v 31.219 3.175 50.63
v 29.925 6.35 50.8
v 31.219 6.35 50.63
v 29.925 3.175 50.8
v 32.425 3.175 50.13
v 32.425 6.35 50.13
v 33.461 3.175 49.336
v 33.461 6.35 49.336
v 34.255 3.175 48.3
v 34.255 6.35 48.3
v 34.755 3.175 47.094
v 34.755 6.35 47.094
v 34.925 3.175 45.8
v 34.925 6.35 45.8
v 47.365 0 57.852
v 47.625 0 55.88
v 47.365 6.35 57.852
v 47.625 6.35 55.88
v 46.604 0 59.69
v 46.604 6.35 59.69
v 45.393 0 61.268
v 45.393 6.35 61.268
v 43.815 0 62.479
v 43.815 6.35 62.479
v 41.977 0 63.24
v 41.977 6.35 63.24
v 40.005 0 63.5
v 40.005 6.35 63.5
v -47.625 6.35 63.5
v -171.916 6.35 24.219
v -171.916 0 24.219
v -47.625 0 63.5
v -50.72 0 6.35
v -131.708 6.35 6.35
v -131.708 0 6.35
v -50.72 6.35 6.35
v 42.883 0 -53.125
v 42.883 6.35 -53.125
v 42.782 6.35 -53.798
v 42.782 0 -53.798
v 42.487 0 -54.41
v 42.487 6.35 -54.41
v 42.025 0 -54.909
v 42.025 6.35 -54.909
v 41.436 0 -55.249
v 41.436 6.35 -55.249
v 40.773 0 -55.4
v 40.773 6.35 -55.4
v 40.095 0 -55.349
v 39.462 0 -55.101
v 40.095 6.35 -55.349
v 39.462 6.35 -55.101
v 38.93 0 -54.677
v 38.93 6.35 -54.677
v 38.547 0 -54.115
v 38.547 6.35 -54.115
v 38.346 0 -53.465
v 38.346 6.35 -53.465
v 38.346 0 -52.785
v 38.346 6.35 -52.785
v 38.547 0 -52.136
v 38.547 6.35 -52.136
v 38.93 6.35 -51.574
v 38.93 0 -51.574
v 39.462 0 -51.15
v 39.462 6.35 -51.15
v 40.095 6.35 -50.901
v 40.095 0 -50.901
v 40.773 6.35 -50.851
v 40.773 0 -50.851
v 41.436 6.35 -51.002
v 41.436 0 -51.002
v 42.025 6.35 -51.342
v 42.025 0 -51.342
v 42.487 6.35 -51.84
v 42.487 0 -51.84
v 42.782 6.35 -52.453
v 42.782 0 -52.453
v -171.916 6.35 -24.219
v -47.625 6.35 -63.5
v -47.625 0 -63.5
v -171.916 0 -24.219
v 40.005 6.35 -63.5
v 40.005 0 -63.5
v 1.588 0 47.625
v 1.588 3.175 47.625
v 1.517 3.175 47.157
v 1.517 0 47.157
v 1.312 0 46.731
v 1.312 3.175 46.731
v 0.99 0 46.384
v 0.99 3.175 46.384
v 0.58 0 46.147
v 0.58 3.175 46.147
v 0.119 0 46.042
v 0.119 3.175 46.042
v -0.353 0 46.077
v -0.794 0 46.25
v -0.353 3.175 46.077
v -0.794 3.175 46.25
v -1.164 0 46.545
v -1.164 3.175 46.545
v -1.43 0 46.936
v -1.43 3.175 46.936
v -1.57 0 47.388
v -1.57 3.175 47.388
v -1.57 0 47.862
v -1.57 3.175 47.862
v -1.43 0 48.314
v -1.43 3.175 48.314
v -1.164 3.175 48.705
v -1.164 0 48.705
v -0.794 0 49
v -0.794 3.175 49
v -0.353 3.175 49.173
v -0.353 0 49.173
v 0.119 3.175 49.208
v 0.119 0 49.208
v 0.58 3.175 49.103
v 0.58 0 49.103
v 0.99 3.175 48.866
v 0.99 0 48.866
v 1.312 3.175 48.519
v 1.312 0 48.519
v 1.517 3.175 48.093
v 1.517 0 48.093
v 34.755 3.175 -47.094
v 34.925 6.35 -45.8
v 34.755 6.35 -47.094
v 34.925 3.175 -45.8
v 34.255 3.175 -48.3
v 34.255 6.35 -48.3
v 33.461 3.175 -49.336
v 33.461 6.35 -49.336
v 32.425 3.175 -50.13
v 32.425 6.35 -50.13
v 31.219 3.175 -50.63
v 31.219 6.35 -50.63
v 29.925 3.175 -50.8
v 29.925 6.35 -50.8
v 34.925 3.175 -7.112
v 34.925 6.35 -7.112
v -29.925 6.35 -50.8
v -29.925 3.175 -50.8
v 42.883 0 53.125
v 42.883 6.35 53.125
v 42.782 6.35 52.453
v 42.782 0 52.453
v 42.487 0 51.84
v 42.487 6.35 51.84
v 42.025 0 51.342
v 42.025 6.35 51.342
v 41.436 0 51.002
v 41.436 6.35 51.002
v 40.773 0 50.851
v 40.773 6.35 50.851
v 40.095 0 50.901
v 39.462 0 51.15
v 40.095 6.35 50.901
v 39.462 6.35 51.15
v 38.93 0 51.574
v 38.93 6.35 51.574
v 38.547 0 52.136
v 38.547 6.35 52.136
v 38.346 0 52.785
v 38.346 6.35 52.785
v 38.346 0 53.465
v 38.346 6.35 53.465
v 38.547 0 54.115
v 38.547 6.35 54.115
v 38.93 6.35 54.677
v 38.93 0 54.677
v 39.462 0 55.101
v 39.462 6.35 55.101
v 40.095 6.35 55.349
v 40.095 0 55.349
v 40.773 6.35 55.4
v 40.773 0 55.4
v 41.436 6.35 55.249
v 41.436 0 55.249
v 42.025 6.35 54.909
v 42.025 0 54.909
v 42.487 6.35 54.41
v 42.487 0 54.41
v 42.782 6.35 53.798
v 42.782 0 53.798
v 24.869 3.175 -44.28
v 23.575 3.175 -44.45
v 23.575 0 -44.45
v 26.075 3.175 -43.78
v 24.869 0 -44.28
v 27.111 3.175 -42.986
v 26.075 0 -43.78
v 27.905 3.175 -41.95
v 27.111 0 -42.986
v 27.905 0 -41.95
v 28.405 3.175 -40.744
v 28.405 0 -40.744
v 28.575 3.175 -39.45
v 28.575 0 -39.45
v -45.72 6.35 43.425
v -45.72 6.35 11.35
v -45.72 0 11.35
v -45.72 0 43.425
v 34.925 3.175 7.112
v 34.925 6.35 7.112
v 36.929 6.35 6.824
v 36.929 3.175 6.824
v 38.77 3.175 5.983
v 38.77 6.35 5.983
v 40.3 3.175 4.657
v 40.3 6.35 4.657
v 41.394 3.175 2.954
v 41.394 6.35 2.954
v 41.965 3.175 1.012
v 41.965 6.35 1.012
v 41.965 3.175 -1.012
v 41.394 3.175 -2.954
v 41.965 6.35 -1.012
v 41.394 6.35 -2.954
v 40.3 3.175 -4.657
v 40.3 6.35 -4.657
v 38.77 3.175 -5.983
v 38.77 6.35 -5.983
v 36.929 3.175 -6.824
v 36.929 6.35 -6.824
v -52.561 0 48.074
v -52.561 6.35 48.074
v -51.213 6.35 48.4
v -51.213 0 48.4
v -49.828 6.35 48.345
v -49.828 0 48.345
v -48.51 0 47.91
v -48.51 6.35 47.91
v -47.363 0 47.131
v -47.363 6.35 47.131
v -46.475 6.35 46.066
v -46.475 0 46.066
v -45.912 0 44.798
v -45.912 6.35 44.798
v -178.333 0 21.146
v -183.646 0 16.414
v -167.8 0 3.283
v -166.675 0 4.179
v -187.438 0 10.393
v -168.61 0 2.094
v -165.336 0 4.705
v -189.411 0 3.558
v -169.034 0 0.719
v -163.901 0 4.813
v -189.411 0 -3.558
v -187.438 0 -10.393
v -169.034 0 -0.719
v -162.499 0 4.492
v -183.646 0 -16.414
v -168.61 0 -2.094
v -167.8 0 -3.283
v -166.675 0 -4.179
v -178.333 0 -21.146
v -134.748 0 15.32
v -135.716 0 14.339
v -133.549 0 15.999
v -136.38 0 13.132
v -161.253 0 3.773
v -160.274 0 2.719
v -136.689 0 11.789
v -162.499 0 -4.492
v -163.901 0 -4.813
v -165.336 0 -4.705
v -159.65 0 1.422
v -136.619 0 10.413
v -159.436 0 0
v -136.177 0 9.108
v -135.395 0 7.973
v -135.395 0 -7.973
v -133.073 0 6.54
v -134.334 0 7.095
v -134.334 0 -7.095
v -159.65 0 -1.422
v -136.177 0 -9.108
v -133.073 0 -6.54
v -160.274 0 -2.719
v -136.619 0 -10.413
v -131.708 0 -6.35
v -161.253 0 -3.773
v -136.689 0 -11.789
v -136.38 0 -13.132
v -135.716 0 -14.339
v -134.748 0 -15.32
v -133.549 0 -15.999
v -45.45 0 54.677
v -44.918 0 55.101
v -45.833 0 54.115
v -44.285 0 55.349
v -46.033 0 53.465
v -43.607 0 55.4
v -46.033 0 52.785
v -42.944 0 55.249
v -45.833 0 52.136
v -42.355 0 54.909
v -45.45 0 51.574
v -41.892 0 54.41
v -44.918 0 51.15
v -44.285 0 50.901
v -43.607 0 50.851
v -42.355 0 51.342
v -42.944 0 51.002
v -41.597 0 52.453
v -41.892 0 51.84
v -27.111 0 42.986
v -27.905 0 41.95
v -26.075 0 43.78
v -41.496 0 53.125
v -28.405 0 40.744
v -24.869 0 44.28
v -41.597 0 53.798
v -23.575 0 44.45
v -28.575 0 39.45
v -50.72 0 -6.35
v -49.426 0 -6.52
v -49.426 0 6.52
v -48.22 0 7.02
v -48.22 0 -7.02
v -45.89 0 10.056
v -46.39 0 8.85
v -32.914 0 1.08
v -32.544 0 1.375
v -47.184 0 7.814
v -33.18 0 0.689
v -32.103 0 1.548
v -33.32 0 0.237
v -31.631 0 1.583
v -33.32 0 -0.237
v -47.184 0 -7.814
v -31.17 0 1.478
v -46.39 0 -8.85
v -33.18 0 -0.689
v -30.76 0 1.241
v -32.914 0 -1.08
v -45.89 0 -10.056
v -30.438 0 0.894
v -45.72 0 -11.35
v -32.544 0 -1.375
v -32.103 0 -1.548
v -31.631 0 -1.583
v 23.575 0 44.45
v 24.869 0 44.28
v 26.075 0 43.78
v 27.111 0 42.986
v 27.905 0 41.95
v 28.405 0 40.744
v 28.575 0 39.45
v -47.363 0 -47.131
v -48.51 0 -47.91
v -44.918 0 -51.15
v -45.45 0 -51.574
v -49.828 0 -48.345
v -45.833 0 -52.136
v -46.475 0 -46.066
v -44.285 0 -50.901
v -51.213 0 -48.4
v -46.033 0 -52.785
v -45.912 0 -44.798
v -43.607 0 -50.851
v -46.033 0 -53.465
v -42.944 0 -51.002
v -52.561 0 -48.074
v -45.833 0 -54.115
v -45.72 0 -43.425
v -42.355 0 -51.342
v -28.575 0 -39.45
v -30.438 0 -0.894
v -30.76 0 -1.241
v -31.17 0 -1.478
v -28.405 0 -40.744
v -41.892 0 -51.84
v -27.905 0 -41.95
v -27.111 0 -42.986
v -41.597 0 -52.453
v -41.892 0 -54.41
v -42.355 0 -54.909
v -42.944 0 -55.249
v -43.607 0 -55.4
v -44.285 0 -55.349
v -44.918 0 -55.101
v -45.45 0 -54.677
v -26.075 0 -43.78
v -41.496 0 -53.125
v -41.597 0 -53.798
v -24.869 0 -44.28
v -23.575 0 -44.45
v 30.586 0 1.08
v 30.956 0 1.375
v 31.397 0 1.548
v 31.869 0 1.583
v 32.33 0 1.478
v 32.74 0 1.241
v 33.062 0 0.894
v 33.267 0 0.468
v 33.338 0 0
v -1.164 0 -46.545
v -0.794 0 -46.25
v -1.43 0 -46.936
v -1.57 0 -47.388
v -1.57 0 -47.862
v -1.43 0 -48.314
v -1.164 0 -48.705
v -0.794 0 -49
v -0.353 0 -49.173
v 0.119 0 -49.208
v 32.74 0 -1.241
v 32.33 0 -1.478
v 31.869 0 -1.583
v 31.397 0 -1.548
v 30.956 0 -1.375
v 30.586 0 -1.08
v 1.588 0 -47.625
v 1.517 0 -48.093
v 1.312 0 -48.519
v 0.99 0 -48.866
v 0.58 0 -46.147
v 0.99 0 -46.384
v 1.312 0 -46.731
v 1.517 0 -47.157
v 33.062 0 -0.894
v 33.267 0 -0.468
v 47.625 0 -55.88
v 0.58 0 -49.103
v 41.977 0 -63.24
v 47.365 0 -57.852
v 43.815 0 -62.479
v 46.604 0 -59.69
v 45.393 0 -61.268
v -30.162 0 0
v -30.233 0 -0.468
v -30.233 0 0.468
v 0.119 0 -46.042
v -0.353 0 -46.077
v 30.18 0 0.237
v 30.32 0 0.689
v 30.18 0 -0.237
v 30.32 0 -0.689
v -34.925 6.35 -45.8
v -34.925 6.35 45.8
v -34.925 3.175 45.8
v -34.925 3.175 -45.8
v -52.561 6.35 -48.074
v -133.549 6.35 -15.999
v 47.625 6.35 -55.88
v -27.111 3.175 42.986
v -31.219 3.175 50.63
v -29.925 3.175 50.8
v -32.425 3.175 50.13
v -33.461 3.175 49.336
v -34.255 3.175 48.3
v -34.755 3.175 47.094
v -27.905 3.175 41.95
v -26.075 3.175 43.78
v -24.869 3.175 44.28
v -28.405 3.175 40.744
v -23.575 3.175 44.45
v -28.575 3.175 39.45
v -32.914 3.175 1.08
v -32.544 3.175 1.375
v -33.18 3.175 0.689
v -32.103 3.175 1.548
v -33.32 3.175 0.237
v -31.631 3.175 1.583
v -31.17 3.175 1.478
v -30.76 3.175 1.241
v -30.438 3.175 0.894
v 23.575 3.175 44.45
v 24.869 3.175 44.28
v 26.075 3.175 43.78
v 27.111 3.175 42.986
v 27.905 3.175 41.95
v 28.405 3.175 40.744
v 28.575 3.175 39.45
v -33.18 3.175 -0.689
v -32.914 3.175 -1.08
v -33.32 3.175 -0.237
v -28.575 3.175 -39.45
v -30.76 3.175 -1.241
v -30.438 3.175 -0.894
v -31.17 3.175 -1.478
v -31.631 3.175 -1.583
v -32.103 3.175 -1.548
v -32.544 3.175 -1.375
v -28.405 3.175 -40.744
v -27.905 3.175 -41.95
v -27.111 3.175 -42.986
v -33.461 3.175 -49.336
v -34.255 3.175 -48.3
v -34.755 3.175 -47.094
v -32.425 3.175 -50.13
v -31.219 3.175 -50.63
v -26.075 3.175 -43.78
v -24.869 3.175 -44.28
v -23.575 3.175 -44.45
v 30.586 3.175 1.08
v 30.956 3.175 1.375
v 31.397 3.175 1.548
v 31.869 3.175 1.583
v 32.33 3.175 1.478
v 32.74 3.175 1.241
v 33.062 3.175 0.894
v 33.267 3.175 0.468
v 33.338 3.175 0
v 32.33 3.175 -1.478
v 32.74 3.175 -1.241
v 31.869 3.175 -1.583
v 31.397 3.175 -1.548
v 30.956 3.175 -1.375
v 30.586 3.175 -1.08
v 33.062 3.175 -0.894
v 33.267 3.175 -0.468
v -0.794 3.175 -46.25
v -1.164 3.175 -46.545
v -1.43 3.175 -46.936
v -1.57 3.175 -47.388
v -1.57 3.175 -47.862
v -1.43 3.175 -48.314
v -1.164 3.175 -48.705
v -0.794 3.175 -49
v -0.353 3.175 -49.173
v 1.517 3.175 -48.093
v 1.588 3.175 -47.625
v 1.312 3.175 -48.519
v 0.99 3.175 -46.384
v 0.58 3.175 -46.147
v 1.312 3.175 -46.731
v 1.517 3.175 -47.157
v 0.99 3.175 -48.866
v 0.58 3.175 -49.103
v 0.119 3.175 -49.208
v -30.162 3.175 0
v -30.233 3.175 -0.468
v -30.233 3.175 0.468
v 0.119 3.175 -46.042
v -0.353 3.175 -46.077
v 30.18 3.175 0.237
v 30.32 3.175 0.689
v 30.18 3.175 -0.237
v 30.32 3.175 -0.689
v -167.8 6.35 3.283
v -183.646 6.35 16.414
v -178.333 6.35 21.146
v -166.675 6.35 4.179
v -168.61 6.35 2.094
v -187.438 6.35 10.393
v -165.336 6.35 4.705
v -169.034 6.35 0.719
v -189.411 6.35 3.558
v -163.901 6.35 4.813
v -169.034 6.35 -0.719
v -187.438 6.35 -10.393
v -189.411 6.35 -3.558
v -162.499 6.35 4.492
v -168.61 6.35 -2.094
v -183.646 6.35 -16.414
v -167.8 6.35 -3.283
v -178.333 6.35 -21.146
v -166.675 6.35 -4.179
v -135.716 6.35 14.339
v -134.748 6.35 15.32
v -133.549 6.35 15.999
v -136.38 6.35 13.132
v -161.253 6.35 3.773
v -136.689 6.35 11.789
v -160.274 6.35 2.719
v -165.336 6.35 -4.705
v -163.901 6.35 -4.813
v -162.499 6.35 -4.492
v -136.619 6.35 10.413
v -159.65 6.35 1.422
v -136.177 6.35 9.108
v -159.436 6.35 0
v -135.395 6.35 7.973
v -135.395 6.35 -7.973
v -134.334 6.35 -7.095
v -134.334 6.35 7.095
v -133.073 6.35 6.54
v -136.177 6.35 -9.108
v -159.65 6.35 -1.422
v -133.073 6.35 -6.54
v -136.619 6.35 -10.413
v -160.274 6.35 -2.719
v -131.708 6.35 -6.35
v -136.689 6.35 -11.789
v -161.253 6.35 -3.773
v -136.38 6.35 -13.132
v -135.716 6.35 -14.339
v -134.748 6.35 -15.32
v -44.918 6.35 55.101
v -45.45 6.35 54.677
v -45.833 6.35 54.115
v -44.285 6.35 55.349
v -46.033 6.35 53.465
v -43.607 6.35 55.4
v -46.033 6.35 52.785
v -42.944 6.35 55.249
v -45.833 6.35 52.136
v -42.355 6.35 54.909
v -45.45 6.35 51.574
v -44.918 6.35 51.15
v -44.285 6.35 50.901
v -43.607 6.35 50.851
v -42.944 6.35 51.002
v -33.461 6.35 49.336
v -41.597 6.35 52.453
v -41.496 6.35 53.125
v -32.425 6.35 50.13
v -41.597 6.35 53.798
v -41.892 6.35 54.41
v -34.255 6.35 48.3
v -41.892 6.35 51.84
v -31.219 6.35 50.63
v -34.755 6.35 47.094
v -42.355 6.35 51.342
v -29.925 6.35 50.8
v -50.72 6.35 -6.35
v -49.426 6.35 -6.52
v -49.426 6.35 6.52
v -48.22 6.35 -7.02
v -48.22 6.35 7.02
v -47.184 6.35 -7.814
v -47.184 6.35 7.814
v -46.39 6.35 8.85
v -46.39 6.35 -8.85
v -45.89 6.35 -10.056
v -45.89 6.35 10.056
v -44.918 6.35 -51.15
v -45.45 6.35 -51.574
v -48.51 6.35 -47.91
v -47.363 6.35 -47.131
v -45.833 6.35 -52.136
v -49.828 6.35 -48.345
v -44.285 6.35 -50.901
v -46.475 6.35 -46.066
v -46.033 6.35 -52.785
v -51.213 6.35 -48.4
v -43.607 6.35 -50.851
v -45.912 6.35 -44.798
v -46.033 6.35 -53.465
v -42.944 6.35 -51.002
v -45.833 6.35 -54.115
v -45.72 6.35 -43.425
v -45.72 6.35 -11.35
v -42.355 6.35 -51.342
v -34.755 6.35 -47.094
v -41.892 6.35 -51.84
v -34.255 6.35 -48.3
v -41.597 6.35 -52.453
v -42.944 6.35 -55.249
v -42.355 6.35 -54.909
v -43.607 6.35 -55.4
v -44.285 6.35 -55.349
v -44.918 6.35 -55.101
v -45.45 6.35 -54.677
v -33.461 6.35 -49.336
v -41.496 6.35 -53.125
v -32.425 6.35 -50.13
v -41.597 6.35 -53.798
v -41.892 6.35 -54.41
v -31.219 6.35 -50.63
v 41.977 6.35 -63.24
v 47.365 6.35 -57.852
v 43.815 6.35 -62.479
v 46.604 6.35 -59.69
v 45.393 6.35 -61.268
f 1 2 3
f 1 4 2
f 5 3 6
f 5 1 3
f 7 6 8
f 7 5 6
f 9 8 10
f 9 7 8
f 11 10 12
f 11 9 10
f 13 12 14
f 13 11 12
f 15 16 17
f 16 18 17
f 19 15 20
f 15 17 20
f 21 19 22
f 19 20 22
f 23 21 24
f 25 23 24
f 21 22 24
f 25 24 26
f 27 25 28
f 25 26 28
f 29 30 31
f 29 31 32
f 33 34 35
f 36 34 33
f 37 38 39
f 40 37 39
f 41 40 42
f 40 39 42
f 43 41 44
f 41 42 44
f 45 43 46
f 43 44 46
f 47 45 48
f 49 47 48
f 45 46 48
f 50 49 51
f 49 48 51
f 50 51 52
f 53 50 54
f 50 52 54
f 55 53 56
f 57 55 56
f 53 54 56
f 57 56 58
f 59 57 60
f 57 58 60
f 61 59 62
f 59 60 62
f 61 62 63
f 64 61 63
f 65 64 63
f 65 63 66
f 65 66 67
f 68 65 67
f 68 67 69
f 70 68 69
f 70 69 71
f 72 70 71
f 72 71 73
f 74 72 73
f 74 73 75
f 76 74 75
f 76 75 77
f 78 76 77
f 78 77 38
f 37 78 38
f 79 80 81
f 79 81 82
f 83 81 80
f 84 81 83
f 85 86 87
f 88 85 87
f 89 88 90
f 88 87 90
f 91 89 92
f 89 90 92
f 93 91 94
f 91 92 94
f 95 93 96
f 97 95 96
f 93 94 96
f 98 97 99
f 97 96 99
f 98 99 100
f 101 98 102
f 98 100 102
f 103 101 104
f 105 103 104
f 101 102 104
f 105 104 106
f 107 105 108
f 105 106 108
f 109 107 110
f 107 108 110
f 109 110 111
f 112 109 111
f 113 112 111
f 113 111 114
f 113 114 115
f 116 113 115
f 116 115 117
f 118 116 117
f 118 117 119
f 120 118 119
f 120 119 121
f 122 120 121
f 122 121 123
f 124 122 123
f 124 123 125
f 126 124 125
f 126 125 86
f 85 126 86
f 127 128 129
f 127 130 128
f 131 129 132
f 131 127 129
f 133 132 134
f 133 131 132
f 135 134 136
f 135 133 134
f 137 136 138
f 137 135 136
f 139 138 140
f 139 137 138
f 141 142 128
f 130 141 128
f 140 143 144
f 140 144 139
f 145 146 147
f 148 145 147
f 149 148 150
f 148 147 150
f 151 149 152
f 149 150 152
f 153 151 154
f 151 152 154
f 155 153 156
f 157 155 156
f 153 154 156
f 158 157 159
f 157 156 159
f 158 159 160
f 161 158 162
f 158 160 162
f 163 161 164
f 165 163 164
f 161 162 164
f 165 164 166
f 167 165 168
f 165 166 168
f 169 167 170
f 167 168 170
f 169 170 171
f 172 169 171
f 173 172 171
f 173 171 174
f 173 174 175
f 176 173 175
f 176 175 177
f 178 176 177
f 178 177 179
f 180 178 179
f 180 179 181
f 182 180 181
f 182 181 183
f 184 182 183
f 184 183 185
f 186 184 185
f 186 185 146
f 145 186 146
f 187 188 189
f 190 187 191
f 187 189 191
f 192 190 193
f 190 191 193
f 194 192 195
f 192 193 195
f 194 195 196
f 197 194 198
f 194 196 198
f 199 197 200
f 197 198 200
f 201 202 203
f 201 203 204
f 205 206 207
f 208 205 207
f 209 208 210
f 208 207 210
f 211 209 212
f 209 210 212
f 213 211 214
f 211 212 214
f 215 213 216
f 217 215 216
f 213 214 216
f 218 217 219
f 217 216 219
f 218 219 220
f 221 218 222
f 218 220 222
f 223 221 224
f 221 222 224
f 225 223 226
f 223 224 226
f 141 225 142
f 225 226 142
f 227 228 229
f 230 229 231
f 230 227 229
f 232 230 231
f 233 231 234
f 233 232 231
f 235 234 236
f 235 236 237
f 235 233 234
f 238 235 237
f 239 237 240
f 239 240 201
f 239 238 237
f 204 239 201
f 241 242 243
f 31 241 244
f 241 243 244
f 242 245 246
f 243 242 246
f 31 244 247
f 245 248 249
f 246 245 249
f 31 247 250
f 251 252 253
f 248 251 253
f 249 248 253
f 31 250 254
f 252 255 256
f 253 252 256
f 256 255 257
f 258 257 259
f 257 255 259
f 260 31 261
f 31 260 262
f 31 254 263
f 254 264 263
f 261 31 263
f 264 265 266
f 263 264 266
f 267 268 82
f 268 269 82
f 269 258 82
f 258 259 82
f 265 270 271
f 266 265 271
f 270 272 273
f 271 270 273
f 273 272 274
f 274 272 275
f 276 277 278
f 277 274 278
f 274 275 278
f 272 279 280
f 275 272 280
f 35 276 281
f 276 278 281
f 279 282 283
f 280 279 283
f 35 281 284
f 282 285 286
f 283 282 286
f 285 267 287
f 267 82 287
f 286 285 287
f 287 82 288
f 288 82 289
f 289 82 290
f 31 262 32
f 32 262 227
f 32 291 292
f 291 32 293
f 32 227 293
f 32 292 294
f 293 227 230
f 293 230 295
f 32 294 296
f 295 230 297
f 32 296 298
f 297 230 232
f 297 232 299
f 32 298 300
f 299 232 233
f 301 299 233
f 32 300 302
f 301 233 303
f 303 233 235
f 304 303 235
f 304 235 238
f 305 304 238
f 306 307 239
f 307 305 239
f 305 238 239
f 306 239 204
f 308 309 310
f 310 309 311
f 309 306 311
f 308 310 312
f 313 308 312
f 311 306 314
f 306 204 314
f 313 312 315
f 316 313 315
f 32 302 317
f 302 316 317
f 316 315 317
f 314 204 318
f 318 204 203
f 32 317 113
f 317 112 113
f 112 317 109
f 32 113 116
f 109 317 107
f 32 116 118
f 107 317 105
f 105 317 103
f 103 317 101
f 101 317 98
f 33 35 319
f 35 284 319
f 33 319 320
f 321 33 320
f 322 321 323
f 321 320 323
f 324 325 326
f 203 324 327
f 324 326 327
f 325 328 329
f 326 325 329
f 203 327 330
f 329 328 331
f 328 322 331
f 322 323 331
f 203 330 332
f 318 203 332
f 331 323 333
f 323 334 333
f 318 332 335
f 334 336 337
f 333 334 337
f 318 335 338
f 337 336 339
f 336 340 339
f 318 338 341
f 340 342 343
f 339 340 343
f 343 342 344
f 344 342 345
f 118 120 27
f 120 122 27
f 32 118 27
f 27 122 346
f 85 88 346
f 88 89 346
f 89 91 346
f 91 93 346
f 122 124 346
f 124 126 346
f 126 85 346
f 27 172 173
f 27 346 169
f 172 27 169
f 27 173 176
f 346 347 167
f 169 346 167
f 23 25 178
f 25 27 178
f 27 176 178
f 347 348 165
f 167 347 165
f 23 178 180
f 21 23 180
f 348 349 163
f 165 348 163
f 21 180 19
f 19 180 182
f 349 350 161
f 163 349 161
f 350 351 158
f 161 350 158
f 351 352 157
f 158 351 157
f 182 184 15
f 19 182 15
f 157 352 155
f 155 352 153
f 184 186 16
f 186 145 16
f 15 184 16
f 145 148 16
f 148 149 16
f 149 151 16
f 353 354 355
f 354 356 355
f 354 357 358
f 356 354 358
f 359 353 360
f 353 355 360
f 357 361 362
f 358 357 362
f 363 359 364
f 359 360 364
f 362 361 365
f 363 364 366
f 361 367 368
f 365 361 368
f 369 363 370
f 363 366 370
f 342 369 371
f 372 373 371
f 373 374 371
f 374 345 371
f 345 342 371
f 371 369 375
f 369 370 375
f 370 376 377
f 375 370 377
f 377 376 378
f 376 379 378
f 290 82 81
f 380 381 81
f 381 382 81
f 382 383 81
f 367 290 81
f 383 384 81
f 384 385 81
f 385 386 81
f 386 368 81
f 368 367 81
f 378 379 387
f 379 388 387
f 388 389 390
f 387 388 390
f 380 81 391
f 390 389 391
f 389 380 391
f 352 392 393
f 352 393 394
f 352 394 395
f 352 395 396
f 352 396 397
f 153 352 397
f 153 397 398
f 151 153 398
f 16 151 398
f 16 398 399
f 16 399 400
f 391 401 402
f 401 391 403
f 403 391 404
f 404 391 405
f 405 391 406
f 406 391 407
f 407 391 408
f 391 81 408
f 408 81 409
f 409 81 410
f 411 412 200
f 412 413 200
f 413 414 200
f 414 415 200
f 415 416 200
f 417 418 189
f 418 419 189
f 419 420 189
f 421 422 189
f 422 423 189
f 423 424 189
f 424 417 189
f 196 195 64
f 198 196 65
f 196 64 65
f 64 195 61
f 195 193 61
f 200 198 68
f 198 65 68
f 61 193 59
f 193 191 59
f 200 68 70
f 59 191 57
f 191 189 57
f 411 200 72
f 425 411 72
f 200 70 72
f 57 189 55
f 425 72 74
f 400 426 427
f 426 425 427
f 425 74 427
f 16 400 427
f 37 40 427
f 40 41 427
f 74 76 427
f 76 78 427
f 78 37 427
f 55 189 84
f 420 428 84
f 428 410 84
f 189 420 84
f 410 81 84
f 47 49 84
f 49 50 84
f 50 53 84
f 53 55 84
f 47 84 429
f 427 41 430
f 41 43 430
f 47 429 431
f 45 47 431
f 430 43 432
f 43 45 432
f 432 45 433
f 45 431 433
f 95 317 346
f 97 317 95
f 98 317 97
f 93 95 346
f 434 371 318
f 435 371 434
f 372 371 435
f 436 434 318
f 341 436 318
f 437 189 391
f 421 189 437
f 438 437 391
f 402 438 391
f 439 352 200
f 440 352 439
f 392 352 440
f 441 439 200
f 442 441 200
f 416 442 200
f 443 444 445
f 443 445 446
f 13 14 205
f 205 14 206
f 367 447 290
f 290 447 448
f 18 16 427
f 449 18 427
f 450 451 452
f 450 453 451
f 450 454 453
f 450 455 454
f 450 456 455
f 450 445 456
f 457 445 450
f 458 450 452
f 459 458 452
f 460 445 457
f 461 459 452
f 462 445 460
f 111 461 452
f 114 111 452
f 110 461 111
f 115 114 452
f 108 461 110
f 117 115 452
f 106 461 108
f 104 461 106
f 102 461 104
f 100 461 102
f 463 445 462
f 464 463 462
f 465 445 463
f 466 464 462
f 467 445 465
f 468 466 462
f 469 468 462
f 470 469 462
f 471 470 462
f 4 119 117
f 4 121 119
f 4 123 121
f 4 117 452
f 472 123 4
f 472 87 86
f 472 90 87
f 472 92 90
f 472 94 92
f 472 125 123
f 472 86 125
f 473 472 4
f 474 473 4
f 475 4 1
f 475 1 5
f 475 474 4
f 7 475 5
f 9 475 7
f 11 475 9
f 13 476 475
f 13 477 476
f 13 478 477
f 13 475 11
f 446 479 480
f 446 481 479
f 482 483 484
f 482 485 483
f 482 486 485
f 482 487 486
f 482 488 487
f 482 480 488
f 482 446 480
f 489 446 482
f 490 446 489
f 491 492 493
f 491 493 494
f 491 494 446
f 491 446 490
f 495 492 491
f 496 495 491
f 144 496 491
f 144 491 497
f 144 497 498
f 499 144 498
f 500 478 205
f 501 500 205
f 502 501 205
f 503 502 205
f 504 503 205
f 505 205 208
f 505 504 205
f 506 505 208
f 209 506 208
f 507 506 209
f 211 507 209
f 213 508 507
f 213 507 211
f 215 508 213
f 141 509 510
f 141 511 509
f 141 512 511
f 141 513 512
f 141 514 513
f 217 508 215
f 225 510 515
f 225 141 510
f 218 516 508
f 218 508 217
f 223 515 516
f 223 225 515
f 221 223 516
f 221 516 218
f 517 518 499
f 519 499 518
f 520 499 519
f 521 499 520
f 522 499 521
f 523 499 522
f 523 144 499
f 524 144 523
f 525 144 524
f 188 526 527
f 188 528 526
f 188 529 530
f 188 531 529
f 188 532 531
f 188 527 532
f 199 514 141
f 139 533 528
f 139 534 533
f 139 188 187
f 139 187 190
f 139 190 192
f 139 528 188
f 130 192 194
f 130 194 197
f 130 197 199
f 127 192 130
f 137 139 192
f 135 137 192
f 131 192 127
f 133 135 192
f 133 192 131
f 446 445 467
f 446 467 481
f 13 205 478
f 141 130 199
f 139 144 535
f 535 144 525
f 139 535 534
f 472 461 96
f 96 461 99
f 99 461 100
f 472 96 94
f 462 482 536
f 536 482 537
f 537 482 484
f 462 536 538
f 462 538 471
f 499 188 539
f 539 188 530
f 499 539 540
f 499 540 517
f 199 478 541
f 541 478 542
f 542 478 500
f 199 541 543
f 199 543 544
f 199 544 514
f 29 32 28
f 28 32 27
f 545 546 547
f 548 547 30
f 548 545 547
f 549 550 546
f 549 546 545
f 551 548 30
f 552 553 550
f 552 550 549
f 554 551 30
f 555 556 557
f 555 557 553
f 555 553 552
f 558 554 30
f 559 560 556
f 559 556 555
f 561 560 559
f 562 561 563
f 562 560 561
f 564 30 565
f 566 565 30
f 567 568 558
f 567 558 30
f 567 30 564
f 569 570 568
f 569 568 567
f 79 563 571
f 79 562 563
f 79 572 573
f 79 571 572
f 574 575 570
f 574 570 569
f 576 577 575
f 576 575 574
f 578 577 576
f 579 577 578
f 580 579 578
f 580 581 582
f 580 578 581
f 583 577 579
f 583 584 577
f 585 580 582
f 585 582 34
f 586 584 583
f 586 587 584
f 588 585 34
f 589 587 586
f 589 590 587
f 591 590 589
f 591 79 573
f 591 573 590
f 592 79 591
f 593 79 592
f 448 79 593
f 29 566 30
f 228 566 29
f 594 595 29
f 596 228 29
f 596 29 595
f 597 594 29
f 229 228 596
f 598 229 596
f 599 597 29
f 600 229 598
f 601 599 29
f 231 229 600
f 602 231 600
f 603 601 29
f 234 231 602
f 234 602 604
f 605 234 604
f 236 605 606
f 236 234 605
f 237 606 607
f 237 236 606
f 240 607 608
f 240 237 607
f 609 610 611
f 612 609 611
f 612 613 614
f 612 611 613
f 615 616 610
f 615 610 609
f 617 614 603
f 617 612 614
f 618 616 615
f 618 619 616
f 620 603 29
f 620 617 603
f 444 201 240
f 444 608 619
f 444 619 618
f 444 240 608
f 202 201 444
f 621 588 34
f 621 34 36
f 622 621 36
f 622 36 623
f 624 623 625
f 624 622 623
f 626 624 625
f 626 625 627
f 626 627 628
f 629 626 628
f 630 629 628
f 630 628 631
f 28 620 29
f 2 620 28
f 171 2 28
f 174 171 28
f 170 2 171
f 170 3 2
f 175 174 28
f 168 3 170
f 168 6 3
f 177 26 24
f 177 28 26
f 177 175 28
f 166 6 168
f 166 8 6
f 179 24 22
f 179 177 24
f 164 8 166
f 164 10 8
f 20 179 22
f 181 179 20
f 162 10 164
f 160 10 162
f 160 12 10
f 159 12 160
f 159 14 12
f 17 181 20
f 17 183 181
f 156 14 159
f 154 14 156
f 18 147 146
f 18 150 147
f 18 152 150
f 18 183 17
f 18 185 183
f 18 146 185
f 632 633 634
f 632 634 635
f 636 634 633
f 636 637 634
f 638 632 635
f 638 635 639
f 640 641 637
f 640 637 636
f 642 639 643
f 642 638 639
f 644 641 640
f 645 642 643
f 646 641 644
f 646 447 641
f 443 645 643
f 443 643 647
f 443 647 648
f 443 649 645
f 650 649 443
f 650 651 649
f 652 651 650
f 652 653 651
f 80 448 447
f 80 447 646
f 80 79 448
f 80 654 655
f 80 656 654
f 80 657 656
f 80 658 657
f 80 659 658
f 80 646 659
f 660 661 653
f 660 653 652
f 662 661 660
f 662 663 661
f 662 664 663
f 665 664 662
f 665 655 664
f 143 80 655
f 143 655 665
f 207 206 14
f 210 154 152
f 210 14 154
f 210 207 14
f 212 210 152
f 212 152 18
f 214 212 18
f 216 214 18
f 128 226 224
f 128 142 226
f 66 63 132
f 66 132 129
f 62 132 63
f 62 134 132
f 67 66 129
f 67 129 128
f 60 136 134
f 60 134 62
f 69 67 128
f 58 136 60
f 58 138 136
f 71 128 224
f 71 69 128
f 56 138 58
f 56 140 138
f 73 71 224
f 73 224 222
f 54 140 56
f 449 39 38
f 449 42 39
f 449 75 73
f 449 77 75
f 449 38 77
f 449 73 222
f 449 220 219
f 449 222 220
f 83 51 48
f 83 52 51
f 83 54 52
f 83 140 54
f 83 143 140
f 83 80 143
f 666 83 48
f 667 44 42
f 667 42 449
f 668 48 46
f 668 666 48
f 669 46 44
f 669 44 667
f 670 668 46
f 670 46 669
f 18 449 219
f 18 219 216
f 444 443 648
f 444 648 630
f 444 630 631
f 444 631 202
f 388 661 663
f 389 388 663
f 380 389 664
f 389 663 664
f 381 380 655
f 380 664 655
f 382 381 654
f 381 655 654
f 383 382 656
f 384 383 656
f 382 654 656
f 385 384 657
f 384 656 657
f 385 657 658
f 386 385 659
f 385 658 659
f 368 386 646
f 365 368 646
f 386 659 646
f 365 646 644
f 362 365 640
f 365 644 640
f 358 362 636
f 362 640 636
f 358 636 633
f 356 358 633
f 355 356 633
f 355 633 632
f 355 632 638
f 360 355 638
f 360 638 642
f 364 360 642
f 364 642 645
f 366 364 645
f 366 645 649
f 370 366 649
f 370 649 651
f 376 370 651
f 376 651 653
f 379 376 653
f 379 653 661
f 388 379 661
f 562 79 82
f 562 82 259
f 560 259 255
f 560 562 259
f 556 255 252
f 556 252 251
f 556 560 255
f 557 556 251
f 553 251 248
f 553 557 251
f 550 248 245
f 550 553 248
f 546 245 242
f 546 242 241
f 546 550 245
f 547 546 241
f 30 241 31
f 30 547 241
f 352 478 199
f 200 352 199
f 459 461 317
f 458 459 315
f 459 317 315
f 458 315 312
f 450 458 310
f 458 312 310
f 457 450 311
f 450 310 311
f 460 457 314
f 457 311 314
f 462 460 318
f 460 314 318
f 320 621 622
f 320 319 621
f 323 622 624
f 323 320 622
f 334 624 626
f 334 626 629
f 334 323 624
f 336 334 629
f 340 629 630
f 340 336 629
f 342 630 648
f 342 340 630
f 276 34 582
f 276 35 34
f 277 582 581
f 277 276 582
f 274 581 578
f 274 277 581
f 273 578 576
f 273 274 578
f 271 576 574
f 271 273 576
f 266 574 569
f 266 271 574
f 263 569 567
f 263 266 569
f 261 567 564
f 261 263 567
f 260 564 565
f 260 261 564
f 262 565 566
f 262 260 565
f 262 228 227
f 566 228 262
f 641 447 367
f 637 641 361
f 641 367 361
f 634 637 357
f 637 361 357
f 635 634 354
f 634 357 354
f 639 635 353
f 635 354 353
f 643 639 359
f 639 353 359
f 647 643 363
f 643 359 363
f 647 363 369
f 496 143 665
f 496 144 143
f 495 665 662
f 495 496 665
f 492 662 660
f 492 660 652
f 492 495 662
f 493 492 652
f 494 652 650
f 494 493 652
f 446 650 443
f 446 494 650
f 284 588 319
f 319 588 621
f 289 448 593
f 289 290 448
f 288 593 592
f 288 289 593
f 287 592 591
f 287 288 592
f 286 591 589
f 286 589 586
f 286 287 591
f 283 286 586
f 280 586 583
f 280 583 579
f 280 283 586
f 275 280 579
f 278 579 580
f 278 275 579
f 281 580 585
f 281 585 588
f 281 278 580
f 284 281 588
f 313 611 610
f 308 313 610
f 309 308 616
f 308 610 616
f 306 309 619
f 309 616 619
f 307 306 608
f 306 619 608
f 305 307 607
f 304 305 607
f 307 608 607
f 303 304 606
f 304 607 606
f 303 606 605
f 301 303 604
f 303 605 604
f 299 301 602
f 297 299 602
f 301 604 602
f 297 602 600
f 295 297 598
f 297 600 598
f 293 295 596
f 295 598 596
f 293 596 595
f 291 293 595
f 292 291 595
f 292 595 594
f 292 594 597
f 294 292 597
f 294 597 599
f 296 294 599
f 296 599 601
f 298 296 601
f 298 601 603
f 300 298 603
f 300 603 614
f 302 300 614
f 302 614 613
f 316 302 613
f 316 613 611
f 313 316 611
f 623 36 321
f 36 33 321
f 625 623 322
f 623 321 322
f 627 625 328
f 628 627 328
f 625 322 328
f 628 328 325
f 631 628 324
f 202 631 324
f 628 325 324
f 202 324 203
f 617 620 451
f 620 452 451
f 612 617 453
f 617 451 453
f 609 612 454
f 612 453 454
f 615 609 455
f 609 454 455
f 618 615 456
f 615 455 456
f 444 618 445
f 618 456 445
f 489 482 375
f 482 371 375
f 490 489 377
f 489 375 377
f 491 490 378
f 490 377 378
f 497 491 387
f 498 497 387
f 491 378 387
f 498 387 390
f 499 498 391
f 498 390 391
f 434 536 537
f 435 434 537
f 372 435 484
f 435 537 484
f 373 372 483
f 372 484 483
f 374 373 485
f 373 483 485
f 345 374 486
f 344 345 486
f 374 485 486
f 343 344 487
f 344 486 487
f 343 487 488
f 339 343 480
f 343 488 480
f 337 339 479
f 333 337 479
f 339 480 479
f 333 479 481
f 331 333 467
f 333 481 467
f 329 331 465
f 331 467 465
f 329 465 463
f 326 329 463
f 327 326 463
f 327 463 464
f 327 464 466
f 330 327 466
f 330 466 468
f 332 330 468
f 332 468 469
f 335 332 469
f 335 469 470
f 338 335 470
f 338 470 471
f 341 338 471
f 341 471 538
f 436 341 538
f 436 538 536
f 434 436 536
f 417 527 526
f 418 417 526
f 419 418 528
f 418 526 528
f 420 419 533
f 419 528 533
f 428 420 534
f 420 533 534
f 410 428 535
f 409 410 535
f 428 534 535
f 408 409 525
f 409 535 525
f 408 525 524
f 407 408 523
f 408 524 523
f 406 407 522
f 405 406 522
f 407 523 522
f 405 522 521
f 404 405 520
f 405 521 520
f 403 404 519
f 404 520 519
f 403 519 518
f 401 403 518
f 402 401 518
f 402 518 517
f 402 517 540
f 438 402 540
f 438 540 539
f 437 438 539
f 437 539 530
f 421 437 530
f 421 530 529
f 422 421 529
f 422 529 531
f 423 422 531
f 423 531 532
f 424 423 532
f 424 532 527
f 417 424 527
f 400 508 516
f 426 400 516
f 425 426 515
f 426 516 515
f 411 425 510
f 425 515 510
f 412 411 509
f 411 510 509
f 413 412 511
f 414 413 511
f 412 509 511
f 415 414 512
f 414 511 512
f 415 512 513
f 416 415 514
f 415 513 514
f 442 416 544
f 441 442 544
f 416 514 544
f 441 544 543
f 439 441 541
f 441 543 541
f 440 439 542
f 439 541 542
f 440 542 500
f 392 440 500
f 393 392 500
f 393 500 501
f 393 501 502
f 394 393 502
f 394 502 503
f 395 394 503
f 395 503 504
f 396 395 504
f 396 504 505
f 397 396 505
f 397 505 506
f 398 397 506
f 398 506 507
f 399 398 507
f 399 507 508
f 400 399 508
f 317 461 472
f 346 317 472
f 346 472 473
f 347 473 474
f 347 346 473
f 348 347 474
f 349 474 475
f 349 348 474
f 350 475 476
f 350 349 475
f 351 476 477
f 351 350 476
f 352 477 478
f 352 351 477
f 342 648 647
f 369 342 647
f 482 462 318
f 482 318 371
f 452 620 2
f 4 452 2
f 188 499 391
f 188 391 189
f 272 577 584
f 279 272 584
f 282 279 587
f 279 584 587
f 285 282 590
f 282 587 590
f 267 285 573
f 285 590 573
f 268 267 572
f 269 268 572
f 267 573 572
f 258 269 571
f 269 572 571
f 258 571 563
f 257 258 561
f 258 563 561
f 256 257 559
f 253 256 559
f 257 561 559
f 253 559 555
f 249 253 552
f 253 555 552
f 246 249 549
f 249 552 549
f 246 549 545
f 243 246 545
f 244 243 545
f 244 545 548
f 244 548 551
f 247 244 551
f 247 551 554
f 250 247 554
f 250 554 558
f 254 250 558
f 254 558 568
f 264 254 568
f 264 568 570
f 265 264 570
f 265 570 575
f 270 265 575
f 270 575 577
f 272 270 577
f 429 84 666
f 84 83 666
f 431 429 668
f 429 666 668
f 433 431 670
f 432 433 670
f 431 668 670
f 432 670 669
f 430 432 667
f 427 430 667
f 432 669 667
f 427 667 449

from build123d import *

# Parameters (mm, degrees)
SKETCH1_W           = 95.25
SKETCH1_H           = 127
BOSS_EXTRUDE1_DEPTH = 6.35
BOSS_EXTRUDE3_DEPTH = 6.35
SKETCH5_R           = 4.826
CUT_EXTRUDE1_DEPTH  = 7.35
CUT_EXTRUDE2_DEPTH  = 7.35
FILLET9_R           = 5
SKETCH7_R           = 5.453804141
BOSS_EXTRUDE4_DEPTH = 6.35
SKETCH8_W           = 69.85
SKETCH8_H           = 101.6
CUT_EXTRUDE3_DEPTH  = 3.175
SKETCH9_W           = 57.15
SKETCH9_H           = 88.9
CUT_EXTRUDE4_DEPTH  = 4.175
SKETCH11_R          = 1.5875
CUT_EXTRUDE6_DEPTH  = 4.175
CUT_EXTRUDE7_DEPTH  = 3.175
FILLET10_R          = 5
FILLET11_R          = 5
FILLET12_R          = 7.62
SKETCH13_R          = 2.2812375
CUT_EXTRUDE8_DEPTH  = 7.35


with BuildPart() as part:
    # Sketch1 → Boss-Extrude1 (new body)
    with BuildSketch(Plane(origin=(0, 0, 0), x_dir=(1, 0, 0), z_dir=(0, 1, 0))):
        Rectangle(SKETCH1_W, SKETCH1_H)
    extrude(amount=BOSS_EXTRUDE1_DEPTH)

    # Sketch4 → Boss-Extrude3 (add)
    with BuildSketch(Plane(origin=(0, 6.35, 0), x_dir=(1, 0, 0), z_dir=(0, 1, 0))):
        with BuildLine():
            Line((-47.625, 63.5), (-171.916018217, 24.219268021))
            ThreePointArc((-171.916018217, 24.219268021), (-189.6618, 0), (-171.916018217, -24.219268021))
            Line((-171.916018217, -24.219268021), (-47.625, -63.5))
            Line((-47.625, -63.5), (-47.625, 63.5))
        make_face()
    extrude(amount=-BOSS_EXTRUDE3_DEPTH)

    # Sketch5 → Cut-Extrude1 (cut, through all)
    with BuildSketch(Plane(origin=(0, 6.35, 0), x_dir=(1, 0, 0), z_dir=(0, 1, 0))):
        with Locations((-164.2618, 0)):
            Circle(SKETCH5_R)
        with Locations((-8.6868, 0)):
            Circle(SKETCH5_R)
    extrude(amount=-CUT_EXTRUDE1_DEPTH, mode=Mode.SUBTRACT)

    # Sketch6 → Cut-Extrude2 (cut, through all)
    with BuildSketch(Plane(origin=(0, 6.35, 0), x_dir=(1, 0, 0), z_dir=(0, 1, 0))):
        Polygon((-45.72, 50.782905742), (-157.9118, 6.35), (-45.72, 6.35), align=None)
        Polygon((-45.72, -6.35), (-45.72, -50.782905742), (-157.9118, -6.35), align=None)
    extrude(amount=-CUT_EXTRUDE2_DEPTH, mode=Mode.SUBTRACT)

    # Fillet9
    fillet9_edges = [part.edges().sort_by_distance(p)[0] for p in [
        (-45.72, 3.175, -50.782905742),
        (-45.72, 3.175, -6.35),
        (-157.9118, 3.175, -6.35),
        (-157.9118, 3.175, 6.35),
        (-45.72, 3.175, 6.35),
        (-45.72, 3.175, 50.782905742),
    ]]
    fillet(fillet9_edges, radius=FILLET9_R)

    # Sketch7 → Boss-Extrude4 (add)
    with BuildSketch(Plane(origin=(0, 6.35, 0), x_dir=(1, 0, 0), z_dir=(0, 1, 0))):
        with Locations((-8.6868, 0)):
            Circle(SKETCH7_R)
    extrude(amount=-BOSS_EXTRUDE4_DEPTH)

    # Sketch8 → Cut-Extrude3 (cut)
    with BuildSketch(Plane(origin=(0, 6.35, 0), x_dir=(1, 0, 0), z_dir=(0, 1, 0))):
        Rectangle(SKETCH8_W, SKETCH8_H)
    extrude(amount=-CUT_EXTRUDE3_DEPTH, mode=Mode.SUBTRACT)

    # Sketch9 → Cut-Extrude4 (cut, through all)
    with BuildSketch(Plane(origin=(0, 3.175, 0), x_dir=(1, 0, 0), z_dir=(0, 1, 0))):
        Rectangle(SKETCH9_W, SKETCH9_H)
    extrude(amount=-CUT_EXTRUDE4_DEPTH, mode=Mode.SUBTRACT)

    # Sketch11 → Cut-Extrude6 (cut, through all)
    with BuildSketch(Plane(origin=(0, 3.175, 0), x_dir=(1, 0, 0), z_dir=(0, 1, 0))):
        with Locations((-31.75, 0)):
            Circle(SKETCH11_R)
        with Locations((31.75, 0)):
            Circle(SKETCH11_R)
        with Locations((0, 47.625)):
            Circle(SKETCH11_R)
        with Locations((0, -47.625)):
            Circle(SKETCH11_R)
    extrude(amount=-CUT_EXTRUDE6_DEPTH, mode=Mode.SUBTRACT)

    # Sketch12 → Cut-Extrude7 (cut)
    with BuildSketch(Plane(origin=(0, 6.35, 0), x_dir=(1, 0, 0), z_dir=(0, 1, 0))):
        with BuildLine():
            Line((34.925, 7.112), (34.925, -7.112))
            ThreePointArc((34.925, -7.112), (42.037, 0), (34.925, 7.112))
        make_face()
    extrude(amount=-CUT_EXTRUDE7_DEPTH, mode=Mode.SUBTRACT)

    # Fillet10
    fillet10_edges = [part.edges().sort_by_distance(p)[0] for p in [
        (-34.925, 4.7625, -50.8),
        (34.925, 4.7625, -50.8),
        (34.925, 4.7625, 50.8),
        (-34.925, 4.7625, 50.8),
    ]]
    fillet(fillet10_edges, radius=FILLET10_R)

    # Fillet11
    fillet11_edges = [part.edges().sort_by_distance(p)[0] for p in [
        (-28.575, 1.5875, 44.45),
        (-28.575, 1.5875, -44.45),
        (28.575, 1.5875, -44.45),
        (28.575, 1.5875, 44.45),
    ]]
    fillet(fillet11_edges, radius=FILLET11_R)

    # Fillet12
    fillet12_edges = [part.edges().sort_by_distance(p)[0] for p in [
        (47.625, 3.175, 63.5),
        (47.625, 3.175, -63.5),
    ]]
    fillet(fillet12_edges, radius=FILLET12_R)

    # Sketch13 → Cut-Extrude8 (cut, through all)
    with BuildSketch(Plane(origin=(0, 6.35, 0), x_dir=(1, 0, 0), z_dir=(0, 1, 0))):
        with Locations((-43.777254611, 53.125383493)):
            Circle(SKETCH13_R)
        with Locations((-43.777254611, -53.125383493)):
            Circle(SKETCH13_R)
        with Locations((40.602254611, -53.125383493)):
            Circle(SKETCH13_R)
        with Locations((40.602254611, 53.125383493)):
            Circle(SKETCH13_R)
    extrude(amount=-CUT_EXTRUDE8_DEPTH, mode=Mode.SUBTRACT)


solid = part.part
